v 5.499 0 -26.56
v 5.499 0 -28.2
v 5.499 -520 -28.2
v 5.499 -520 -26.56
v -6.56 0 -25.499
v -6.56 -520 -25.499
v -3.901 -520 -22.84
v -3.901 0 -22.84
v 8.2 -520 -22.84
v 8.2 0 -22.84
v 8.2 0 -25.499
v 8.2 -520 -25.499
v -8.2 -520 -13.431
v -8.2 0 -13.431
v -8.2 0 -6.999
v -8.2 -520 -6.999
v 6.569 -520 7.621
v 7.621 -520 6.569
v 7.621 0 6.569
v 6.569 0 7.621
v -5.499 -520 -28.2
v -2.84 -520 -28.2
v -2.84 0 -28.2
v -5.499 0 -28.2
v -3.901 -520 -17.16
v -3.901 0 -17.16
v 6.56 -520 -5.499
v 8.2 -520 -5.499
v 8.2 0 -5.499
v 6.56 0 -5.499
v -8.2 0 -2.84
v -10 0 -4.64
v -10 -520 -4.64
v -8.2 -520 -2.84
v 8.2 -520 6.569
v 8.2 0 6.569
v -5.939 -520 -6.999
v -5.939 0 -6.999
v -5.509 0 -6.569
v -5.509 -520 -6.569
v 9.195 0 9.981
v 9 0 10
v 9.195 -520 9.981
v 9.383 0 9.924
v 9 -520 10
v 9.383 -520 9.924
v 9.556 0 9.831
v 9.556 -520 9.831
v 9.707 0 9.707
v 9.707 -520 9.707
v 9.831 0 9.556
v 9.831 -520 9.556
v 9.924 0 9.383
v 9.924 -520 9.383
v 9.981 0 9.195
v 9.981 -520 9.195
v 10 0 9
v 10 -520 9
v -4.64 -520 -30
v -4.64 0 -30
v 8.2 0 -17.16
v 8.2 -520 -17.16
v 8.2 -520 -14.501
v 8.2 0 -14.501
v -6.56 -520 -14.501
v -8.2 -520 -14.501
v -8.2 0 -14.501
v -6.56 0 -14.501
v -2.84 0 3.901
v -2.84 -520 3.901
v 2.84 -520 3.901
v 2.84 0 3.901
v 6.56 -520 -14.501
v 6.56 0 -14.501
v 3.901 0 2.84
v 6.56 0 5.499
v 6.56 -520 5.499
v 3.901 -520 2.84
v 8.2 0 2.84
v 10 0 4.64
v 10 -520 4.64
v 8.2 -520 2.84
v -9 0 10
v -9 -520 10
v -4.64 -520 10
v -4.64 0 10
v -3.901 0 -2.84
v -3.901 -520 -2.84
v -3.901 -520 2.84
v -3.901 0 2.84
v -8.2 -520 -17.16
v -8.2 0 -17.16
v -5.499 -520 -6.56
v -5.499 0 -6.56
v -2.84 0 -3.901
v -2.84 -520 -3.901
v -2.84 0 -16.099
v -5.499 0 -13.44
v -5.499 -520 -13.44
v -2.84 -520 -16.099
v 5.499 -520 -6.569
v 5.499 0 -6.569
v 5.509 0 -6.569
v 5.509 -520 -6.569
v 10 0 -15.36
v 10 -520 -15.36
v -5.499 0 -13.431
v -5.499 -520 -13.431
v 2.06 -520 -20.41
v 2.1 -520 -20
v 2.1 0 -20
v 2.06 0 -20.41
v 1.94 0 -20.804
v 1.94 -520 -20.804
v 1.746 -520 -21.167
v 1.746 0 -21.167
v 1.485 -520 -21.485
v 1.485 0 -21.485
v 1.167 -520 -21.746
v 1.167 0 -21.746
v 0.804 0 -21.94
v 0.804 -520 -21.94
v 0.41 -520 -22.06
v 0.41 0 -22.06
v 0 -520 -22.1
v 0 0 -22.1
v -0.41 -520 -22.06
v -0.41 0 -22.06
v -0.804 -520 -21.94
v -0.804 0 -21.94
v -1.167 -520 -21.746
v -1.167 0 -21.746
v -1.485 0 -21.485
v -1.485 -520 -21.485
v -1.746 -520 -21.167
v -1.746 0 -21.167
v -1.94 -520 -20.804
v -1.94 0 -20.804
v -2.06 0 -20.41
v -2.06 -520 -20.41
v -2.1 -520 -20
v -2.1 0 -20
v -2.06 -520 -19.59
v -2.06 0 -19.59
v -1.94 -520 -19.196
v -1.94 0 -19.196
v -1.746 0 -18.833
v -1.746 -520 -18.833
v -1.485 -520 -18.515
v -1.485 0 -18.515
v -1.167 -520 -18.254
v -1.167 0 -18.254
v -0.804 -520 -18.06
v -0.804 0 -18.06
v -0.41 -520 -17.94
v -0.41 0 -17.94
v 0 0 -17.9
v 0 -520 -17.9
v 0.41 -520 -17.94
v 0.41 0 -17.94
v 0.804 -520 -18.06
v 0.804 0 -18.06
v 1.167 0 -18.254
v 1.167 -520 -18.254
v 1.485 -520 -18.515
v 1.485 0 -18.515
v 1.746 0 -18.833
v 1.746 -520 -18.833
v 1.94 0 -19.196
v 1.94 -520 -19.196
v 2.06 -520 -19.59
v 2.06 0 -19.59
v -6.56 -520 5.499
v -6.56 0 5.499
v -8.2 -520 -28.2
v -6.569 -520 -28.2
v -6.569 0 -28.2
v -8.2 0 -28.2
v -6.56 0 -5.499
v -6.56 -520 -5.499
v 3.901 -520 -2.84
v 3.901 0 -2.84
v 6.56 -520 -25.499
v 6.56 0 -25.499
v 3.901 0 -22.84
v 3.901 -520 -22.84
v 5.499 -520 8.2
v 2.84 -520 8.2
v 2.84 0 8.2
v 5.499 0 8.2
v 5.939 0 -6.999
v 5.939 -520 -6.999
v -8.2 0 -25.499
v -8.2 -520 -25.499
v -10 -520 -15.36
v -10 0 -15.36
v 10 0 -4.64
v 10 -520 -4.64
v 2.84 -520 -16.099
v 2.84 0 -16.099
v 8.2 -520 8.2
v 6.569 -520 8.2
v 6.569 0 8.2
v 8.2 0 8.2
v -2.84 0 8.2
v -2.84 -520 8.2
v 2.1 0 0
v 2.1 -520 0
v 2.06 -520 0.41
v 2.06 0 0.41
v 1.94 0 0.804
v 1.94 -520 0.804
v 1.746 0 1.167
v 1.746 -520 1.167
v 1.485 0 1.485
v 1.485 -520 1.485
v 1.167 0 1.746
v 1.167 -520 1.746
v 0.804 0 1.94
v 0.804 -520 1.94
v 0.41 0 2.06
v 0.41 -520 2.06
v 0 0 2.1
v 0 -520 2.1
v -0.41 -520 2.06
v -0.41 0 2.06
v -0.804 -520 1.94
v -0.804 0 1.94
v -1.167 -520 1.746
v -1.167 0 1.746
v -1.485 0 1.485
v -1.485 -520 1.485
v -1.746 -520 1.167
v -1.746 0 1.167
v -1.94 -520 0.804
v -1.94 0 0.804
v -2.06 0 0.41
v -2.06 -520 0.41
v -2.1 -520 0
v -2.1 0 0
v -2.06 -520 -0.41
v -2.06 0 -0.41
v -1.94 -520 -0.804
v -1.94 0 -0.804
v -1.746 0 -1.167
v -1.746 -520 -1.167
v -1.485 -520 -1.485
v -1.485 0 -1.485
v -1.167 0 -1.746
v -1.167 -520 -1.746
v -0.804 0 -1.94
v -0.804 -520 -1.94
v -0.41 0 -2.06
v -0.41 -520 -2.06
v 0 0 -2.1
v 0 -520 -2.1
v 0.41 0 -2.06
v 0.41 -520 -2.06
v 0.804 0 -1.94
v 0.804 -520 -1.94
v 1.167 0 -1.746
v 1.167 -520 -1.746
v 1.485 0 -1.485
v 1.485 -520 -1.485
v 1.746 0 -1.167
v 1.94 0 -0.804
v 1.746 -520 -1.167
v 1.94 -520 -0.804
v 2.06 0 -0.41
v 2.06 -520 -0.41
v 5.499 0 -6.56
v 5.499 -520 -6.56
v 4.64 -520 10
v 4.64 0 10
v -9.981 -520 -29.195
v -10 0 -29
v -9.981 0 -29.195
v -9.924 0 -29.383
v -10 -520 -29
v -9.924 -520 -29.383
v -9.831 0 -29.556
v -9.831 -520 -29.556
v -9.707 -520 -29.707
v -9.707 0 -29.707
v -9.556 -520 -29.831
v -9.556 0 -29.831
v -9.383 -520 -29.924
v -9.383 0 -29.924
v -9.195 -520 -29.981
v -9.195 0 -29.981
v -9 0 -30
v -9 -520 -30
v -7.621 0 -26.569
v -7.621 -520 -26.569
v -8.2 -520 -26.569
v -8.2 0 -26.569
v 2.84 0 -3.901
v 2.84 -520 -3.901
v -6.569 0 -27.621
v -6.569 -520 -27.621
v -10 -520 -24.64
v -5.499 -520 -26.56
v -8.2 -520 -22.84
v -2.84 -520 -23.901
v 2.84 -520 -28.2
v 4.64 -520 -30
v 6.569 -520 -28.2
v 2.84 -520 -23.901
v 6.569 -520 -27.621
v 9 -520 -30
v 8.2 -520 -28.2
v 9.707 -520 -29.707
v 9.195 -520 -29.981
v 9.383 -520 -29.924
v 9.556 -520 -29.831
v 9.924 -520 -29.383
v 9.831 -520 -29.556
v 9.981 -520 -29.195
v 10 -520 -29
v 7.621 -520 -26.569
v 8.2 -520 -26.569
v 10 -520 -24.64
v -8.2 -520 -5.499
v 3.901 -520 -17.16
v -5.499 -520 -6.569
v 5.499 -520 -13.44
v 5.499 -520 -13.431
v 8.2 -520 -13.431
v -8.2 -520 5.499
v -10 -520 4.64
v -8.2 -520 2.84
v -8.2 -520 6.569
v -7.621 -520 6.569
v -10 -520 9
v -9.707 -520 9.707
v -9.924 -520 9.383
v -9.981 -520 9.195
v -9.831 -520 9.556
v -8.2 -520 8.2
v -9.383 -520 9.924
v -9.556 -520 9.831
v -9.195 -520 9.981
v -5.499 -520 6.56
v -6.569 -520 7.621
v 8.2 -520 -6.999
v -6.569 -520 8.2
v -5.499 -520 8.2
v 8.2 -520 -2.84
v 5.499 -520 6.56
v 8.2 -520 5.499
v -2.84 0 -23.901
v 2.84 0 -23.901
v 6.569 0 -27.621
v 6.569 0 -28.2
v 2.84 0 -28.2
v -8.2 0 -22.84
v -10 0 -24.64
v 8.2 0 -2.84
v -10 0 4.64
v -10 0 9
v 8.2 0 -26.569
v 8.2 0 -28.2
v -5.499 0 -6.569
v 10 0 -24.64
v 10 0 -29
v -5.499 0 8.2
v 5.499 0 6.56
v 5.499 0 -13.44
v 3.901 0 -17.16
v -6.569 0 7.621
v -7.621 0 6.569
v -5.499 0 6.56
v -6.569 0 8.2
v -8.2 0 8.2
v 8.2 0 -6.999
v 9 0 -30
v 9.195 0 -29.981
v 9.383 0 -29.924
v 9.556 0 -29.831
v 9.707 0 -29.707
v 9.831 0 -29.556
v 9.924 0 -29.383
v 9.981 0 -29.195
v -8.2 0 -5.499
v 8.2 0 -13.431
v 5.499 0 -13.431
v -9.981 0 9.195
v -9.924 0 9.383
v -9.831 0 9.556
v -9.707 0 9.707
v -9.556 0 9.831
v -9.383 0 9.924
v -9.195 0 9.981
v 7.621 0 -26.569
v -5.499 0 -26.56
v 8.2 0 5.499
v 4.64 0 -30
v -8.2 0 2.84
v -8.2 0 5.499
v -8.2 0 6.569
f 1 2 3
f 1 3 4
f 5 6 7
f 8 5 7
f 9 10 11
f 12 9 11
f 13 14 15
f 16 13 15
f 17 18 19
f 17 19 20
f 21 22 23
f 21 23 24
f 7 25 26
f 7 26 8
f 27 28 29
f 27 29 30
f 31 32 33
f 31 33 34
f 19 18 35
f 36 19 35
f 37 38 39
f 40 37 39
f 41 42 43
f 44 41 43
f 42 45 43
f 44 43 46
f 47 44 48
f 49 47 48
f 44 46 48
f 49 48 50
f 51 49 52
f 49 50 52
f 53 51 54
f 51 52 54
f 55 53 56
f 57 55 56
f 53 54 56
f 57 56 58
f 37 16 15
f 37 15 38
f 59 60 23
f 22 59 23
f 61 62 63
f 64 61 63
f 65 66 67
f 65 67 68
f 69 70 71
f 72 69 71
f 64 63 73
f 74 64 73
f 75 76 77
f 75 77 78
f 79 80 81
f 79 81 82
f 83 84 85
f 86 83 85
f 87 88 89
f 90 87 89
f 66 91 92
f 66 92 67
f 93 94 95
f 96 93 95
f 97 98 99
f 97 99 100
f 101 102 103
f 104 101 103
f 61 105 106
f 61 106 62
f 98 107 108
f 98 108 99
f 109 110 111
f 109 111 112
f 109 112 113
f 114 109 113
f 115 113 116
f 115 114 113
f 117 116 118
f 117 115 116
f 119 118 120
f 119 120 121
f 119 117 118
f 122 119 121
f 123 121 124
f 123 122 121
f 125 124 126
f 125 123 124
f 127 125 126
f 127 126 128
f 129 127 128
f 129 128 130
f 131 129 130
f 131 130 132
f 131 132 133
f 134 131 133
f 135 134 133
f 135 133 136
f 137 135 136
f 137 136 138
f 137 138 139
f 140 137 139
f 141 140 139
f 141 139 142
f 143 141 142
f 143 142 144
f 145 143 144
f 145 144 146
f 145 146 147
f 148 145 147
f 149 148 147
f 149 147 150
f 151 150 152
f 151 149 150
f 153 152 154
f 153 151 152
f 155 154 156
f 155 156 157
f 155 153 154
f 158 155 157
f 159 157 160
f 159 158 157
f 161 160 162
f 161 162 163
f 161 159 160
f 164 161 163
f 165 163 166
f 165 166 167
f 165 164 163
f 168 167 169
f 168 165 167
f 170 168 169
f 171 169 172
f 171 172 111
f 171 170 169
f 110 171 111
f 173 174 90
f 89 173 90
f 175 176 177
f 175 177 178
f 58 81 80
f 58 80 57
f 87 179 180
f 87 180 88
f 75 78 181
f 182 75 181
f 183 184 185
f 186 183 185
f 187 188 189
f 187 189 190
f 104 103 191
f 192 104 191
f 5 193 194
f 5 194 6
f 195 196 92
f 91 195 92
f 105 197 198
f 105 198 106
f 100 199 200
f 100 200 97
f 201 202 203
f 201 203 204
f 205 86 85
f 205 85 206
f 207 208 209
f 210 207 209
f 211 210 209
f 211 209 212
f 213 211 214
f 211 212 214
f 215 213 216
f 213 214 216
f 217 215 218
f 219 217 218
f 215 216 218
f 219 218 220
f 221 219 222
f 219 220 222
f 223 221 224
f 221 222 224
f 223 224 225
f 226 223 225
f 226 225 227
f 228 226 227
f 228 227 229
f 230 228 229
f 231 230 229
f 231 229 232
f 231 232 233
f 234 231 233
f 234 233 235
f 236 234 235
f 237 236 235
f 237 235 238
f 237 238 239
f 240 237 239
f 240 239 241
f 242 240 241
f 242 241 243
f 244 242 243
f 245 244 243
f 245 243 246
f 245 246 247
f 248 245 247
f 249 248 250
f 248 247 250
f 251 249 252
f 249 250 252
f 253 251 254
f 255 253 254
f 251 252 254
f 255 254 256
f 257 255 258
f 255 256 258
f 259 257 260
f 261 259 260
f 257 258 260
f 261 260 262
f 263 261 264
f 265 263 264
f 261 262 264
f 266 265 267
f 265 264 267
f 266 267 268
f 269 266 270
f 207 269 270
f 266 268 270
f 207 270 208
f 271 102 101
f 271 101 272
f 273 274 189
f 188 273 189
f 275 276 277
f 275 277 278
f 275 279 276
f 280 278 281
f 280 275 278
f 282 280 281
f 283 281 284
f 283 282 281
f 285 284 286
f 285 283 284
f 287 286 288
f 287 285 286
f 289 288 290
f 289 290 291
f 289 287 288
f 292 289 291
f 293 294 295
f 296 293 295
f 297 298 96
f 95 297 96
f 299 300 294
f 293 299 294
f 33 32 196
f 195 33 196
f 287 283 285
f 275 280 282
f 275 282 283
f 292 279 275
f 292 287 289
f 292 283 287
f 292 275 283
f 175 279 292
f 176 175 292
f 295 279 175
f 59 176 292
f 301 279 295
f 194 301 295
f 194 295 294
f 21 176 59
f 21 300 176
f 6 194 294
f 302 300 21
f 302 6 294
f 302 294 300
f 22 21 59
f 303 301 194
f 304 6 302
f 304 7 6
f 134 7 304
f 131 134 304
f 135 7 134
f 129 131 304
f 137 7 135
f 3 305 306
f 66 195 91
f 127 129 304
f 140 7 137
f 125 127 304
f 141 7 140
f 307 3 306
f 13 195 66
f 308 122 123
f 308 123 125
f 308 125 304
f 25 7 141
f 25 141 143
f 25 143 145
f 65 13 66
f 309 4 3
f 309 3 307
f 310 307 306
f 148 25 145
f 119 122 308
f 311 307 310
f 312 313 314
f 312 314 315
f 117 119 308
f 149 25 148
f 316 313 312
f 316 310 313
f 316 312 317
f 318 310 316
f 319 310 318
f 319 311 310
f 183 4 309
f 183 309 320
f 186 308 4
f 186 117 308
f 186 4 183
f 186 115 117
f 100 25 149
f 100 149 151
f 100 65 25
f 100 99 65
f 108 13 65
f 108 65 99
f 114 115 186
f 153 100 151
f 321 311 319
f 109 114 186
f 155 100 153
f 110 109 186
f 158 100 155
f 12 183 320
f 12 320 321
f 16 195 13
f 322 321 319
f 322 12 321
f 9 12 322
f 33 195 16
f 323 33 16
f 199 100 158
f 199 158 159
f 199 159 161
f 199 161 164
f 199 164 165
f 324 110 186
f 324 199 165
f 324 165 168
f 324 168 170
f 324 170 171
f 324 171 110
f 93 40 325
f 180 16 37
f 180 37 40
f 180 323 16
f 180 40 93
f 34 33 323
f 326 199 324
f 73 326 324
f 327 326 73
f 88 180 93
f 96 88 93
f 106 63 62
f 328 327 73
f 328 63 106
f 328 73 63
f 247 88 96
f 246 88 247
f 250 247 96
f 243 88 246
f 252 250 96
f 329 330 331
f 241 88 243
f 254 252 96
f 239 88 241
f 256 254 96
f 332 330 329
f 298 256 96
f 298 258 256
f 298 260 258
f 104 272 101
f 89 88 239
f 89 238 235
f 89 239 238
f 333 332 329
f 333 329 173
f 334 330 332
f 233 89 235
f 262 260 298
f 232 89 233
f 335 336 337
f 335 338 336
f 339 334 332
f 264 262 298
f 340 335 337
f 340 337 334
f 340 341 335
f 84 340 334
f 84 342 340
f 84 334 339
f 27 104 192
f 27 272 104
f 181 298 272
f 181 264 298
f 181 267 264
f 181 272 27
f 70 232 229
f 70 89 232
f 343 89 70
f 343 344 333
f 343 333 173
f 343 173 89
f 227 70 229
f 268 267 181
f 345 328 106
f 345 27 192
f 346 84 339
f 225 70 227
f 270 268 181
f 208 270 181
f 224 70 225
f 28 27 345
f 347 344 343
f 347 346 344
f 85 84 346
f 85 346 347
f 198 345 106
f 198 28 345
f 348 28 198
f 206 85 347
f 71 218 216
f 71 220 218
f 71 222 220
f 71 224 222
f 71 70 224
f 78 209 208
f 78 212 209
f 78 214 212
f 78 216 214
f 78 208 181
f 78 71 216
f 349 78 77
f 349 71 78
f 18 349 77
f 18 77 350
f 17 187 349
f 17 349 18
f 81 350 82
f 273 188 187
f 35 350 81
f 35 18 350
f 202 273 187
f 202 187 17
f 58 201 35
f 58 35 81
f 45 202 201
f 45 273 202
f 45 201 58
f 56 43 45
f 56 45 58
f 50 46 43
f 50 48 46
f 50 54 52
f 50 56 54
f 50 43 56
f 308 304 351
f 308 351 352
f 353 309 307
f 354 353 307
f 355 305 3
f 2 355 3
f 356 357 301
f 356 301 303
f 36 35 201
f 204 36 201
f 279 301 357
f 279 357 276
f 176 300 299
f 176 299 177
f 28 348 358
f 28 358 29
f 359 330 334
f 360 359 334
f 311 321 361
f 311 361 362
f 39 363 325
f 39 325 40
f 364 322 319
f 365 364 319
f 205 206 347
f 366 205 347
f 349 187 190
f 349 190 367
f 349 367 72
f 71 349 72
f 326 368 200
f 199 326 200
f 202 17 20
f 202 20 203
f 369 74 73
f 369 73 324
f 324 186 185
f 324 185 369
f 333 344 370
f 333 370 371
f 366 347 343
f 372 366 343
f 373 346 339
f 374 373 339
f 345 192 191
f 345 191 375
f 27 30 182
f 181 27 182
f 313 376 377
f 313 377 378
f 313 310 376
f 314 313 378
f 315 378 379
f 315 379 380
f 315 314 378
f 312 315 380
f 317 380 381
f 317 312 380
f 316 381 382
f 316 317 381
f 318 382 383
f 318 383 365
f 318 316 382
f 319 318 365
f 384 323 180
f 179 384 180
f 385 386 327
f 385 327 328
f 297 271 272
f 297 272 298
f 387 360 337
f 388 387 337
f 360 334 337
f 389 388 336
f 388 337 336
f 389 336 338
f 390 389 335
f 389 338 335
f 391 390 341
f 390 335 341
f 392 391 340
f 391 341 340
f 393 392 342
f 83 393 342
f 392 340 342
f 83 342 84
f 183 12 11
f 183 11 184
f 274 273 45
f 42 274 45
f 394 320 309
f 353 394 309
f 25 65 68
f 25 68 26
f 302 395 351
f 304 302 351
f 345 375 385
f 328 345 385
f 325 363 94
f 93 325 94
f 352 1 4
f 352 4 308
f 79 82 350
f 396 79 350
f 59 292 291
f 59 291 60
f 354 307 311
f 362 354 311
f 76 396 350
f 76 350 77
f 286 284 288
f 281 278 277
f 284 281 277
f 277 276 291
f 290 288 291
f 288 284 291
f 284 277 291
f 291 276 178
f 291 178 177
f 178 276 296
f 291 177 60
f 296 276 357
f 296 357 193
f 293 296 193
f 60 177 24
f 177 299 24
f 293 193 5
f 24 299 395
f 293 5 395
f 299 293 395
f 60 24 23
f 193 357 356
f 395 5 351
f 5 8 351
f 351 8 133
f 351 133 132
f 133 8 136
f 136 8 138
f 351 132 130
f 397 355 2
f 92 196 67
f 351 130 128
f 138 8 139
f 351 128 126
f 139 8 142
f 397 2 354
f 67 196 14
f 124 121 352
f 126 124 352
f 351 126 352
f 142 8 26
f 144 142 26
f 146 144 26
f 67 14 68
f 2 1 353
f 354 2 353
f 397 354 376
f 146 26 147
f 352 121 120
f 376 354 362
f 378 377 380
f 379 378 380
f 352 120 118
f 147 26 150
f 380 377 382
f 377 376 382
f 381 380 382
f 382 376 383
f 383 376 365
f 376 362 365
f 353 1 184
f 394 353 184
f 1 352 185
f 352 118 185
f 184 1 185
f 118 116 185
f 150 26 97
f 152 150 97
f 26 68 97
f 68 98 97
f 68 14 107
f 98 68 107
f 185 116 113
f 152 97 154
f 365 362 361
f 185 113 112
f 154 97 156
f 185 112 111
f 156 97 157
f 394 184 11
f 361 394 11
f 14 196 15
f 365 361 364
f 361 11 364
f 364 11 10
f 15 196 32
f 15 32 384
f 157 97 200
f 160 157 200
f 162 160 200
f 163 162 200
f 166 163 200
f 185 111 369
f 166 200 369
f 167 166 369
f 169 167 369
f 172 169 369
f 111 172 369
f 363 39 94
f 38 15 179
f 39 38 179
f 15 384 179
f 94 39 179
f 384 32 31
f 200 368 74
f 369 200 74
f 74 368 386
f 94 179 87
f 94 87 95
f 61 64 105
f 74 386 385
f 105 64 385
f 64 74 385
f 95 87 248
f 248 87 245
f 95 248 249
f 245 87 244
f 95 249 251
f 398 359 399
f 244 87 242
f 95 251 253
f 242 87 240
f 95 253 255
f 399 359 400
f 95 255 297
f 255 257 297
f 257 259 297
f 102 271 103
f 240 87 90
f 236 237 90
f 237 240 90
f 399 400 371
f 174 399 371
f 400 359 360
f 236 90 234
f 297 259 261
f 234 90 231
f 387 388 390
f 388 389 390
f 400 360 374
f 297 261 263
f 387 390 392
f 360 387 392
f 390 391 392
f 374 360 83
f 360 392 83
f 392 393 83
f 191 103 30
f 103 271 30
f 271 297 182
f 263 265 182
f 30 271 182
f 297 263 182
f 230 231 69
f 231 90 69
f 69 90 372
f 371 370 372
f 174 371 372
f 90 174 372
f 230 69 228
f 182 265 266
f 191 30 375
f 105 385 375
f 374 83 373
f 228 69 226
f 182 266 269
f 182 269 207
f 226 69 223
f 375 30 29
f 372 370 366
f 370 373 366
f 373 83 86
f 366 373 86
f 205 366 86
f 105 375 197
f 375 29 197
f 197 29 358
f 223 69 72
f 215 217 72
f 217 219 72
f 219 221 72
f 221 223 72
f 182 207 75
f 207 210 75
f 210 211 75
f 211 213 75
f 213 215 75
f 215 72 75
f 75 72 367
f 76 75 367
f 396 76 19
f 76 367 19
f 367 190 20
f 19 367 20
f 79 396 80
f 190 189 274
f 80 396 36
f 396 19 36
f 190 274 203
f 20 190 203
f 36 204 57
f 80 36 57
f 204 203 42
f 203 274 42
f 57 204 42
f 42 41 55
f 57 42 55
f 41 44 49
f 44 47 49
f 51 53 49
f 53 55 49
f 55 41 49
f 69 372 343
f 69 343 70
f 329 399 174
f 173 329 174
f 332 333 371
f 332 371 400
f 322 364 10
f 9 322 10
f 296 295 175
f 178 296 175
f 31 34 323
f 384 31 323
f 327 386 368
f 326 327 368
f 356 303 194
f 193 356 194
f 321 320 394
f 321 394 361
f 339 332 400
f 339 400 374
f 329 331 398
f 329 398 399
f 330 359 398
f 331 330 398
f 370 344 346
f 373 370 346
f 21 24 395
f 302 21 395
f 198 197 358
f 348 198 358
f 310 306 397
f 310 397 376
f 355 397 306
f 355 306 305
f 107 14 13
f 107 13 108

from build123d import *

# Parameters (mm, degrees)
F0_W             = 20
F0_H             = 20
F1_DEPTH         = 520
F2_R             = 2.1
F3_DEPTH         = 520.001
F4_R             = 1
F6_DEPTH         = 520.001
F6_COPIES3_COUNT = 2
F6_COPIES3_ANGLE = 90
F6_COPIES4_COUNT = 2
F6_COPIES4_ANGLE = 270
F6_COPIES6_COUNT = 2
F9_W             = 16.4
F9_H             = 6.8613203436
F10_DEPTH        = 520.001
F12_DEPTH        = 520


# Not quite as in the source:
# - a pattern or mirror of a feature is missing from the dataset's text; its kind, count and spacing are read off the source's solid


with BuildPart() as f1:
    # F0 (on Front) → F1 (new body)
    with BuildSketch(Plane.XZ):
        Rectangle(F0_W, F0_H)
    extrude(amount=F1_DEPTH)

    # F2 (on face) → F3 (cut, through all)
    with BuildSketch(Plane.XZ.offset(520)):
        Circle(F2_R)
    extrude(amount=-F3_DEPTH, mode=Mode.SUBTRACT)

    # F4
    f4_edges = [f1.edges().sort_by_distance(p)[0] for p in [
        (-10, -260, 10),
        (10, -260, 10),
    ]]
    fillet(f4_edges, radius=F4_R)

    # F5 (on face) → F6 (cut, through all)
    with BuildSketch(Plane.XZ.offset(520)):
        Polygon((0, 3.9006601718), (0, 10), (-2.84, 10), (-4.64, 10), (-2.84, 8.2), (-5.4993398282, 8.2), (-5.4993398282, 6.56), (-2.84, 3.9006601718), align=None)
        Polygon((-6.5693398282, 8.2), (-8.2, 8.2), (-7.0953059148, 7.0953059148), (-6.5693398282, 7.6212720014), align=None)
    f6 = extrude(amount=-F6_DEPTH, mode=Mode.SUBTRACT)

    # F6_copies: F6 across plane
    add(f6.mirror(Plane(origin=(0, 0, 0), x_dir=(-0.7071067812, 0, -0.7071067812), z_dir=(0.7071067812, 0, -0.7071067812))), mode=Mode.SUBTRACT)

    # F6_copies1: F6 across plane
    add(f6.mirror(Plane(origin=(0, 0, 0), x_dir=(0.7071067812, 0, -0.7071067812), z_dir=(-0.7071067812, 0, -0.7071067812))), mode=Mode.SUBTRACT)

    # F6_copies2: F6 across plane
    add(f6.mirror(Plane(origin=(0, 0, 0), x_dir=(0, 0, 1), z_dir=(1, 0, 0))), mode=Mode.SUBTRACT)

    # F6_copies3: F6 ×2 about axis
    f6_copies3_axis = Axis((0, 0, 0), (0, 1, 0))
    for i in range(1, F6_COPIES3_COUNT):
        add(f6.rotate(f6_copies3_axis, i * F6_COPIES3_ANGLE / (F6_COPIES3_COUNT - 1)), mode=Mode.SUBTRACT)

    # F6_copies4: F6 ×2 about axis
    f6_copies4_axis = Axis((0, 0, 0), (0, 1, 0))
    for i in range(1, F6_COPIES4_COUNT):
        add(f6.rotate(f6_copies4_axis, i * F6_COPIES4_ANGLE / (F6_COPIES4_COUNT - 1)), mode=Mode.SUBTRACT)

    # F6_copies5: F6 across plane
    add(f6.mirror(Plane(origin=(0, 0, 0), x_dir=(-1, 0, 0), z_dir=(0, 0, -1))), mode=Mode.SUBTRACT)

    # F6_copies6: F6 ×2 about axis
    f6_copies6_axis = Axis((0, 0, 0), (0, 1, 0))
    for i in range(1, F6_COPIES6_COUNT):
        add(f6.rotate(f6_copies6_axis, i * 360 / F6_COPIES6_COUNT), mode=Mode.SUBTRACT)

    # F8: F1 across face


with BuildPart() as f1_1:
    add(f1.part)
    add(f1.part.mirror(Plane(origin=(-7.32, -260, -10), x_dir=(1, 0, 0), z_dir=(0, 0, -1))))

    # F9 (on face) → F10 (cut, through all)
    with BuildSketch(Plane.XZ.offset(520)):
        with Locations((0, -10)):
            Rectangle(F9_W, F9_H)
    extrude(amount=-F10_DEPTH, mode=Mode.SUBTRACT)

    # F11 (on face) → F12 (join, through all)
    with BuildSketch(Plane.XZ.offset(520)):
        with BuildLine():
            ThreePointArc((-9, -10), (-9.7071067812, -9.7071067812), (-10, -9))
            Line((-10, -9), (-10, -11))
            ThreePointArc((-10, -11), (-9.7071067812, -10.2928932188), (-9, -10))
        make_face()
        with BuildLine():
            ThreePointArc((10, -9), (9.7071067812, -9.7071067812), (9, -10))
            ThreePointArc((9, -10), (9.7071067812, -10.2928932188), (10, -11))
            Line((10, -11), (10, -9))
        make_face()
        Polygon((5.9386796564, -6.9993398282), (8.2, -6.9993398282), (8.2, -6.5693398282), (5.5086796564, -6.5693398282), align=None)
        Polygon((-8.2, -6.5693398282), (-8.2, -6.9993398282), (-5.9386796564, -6.9993398282), (-5.5086796564, -6.5693398282), align=None)
    extrude(amount=-F12_DEPTH)


solid = f1_1.part
